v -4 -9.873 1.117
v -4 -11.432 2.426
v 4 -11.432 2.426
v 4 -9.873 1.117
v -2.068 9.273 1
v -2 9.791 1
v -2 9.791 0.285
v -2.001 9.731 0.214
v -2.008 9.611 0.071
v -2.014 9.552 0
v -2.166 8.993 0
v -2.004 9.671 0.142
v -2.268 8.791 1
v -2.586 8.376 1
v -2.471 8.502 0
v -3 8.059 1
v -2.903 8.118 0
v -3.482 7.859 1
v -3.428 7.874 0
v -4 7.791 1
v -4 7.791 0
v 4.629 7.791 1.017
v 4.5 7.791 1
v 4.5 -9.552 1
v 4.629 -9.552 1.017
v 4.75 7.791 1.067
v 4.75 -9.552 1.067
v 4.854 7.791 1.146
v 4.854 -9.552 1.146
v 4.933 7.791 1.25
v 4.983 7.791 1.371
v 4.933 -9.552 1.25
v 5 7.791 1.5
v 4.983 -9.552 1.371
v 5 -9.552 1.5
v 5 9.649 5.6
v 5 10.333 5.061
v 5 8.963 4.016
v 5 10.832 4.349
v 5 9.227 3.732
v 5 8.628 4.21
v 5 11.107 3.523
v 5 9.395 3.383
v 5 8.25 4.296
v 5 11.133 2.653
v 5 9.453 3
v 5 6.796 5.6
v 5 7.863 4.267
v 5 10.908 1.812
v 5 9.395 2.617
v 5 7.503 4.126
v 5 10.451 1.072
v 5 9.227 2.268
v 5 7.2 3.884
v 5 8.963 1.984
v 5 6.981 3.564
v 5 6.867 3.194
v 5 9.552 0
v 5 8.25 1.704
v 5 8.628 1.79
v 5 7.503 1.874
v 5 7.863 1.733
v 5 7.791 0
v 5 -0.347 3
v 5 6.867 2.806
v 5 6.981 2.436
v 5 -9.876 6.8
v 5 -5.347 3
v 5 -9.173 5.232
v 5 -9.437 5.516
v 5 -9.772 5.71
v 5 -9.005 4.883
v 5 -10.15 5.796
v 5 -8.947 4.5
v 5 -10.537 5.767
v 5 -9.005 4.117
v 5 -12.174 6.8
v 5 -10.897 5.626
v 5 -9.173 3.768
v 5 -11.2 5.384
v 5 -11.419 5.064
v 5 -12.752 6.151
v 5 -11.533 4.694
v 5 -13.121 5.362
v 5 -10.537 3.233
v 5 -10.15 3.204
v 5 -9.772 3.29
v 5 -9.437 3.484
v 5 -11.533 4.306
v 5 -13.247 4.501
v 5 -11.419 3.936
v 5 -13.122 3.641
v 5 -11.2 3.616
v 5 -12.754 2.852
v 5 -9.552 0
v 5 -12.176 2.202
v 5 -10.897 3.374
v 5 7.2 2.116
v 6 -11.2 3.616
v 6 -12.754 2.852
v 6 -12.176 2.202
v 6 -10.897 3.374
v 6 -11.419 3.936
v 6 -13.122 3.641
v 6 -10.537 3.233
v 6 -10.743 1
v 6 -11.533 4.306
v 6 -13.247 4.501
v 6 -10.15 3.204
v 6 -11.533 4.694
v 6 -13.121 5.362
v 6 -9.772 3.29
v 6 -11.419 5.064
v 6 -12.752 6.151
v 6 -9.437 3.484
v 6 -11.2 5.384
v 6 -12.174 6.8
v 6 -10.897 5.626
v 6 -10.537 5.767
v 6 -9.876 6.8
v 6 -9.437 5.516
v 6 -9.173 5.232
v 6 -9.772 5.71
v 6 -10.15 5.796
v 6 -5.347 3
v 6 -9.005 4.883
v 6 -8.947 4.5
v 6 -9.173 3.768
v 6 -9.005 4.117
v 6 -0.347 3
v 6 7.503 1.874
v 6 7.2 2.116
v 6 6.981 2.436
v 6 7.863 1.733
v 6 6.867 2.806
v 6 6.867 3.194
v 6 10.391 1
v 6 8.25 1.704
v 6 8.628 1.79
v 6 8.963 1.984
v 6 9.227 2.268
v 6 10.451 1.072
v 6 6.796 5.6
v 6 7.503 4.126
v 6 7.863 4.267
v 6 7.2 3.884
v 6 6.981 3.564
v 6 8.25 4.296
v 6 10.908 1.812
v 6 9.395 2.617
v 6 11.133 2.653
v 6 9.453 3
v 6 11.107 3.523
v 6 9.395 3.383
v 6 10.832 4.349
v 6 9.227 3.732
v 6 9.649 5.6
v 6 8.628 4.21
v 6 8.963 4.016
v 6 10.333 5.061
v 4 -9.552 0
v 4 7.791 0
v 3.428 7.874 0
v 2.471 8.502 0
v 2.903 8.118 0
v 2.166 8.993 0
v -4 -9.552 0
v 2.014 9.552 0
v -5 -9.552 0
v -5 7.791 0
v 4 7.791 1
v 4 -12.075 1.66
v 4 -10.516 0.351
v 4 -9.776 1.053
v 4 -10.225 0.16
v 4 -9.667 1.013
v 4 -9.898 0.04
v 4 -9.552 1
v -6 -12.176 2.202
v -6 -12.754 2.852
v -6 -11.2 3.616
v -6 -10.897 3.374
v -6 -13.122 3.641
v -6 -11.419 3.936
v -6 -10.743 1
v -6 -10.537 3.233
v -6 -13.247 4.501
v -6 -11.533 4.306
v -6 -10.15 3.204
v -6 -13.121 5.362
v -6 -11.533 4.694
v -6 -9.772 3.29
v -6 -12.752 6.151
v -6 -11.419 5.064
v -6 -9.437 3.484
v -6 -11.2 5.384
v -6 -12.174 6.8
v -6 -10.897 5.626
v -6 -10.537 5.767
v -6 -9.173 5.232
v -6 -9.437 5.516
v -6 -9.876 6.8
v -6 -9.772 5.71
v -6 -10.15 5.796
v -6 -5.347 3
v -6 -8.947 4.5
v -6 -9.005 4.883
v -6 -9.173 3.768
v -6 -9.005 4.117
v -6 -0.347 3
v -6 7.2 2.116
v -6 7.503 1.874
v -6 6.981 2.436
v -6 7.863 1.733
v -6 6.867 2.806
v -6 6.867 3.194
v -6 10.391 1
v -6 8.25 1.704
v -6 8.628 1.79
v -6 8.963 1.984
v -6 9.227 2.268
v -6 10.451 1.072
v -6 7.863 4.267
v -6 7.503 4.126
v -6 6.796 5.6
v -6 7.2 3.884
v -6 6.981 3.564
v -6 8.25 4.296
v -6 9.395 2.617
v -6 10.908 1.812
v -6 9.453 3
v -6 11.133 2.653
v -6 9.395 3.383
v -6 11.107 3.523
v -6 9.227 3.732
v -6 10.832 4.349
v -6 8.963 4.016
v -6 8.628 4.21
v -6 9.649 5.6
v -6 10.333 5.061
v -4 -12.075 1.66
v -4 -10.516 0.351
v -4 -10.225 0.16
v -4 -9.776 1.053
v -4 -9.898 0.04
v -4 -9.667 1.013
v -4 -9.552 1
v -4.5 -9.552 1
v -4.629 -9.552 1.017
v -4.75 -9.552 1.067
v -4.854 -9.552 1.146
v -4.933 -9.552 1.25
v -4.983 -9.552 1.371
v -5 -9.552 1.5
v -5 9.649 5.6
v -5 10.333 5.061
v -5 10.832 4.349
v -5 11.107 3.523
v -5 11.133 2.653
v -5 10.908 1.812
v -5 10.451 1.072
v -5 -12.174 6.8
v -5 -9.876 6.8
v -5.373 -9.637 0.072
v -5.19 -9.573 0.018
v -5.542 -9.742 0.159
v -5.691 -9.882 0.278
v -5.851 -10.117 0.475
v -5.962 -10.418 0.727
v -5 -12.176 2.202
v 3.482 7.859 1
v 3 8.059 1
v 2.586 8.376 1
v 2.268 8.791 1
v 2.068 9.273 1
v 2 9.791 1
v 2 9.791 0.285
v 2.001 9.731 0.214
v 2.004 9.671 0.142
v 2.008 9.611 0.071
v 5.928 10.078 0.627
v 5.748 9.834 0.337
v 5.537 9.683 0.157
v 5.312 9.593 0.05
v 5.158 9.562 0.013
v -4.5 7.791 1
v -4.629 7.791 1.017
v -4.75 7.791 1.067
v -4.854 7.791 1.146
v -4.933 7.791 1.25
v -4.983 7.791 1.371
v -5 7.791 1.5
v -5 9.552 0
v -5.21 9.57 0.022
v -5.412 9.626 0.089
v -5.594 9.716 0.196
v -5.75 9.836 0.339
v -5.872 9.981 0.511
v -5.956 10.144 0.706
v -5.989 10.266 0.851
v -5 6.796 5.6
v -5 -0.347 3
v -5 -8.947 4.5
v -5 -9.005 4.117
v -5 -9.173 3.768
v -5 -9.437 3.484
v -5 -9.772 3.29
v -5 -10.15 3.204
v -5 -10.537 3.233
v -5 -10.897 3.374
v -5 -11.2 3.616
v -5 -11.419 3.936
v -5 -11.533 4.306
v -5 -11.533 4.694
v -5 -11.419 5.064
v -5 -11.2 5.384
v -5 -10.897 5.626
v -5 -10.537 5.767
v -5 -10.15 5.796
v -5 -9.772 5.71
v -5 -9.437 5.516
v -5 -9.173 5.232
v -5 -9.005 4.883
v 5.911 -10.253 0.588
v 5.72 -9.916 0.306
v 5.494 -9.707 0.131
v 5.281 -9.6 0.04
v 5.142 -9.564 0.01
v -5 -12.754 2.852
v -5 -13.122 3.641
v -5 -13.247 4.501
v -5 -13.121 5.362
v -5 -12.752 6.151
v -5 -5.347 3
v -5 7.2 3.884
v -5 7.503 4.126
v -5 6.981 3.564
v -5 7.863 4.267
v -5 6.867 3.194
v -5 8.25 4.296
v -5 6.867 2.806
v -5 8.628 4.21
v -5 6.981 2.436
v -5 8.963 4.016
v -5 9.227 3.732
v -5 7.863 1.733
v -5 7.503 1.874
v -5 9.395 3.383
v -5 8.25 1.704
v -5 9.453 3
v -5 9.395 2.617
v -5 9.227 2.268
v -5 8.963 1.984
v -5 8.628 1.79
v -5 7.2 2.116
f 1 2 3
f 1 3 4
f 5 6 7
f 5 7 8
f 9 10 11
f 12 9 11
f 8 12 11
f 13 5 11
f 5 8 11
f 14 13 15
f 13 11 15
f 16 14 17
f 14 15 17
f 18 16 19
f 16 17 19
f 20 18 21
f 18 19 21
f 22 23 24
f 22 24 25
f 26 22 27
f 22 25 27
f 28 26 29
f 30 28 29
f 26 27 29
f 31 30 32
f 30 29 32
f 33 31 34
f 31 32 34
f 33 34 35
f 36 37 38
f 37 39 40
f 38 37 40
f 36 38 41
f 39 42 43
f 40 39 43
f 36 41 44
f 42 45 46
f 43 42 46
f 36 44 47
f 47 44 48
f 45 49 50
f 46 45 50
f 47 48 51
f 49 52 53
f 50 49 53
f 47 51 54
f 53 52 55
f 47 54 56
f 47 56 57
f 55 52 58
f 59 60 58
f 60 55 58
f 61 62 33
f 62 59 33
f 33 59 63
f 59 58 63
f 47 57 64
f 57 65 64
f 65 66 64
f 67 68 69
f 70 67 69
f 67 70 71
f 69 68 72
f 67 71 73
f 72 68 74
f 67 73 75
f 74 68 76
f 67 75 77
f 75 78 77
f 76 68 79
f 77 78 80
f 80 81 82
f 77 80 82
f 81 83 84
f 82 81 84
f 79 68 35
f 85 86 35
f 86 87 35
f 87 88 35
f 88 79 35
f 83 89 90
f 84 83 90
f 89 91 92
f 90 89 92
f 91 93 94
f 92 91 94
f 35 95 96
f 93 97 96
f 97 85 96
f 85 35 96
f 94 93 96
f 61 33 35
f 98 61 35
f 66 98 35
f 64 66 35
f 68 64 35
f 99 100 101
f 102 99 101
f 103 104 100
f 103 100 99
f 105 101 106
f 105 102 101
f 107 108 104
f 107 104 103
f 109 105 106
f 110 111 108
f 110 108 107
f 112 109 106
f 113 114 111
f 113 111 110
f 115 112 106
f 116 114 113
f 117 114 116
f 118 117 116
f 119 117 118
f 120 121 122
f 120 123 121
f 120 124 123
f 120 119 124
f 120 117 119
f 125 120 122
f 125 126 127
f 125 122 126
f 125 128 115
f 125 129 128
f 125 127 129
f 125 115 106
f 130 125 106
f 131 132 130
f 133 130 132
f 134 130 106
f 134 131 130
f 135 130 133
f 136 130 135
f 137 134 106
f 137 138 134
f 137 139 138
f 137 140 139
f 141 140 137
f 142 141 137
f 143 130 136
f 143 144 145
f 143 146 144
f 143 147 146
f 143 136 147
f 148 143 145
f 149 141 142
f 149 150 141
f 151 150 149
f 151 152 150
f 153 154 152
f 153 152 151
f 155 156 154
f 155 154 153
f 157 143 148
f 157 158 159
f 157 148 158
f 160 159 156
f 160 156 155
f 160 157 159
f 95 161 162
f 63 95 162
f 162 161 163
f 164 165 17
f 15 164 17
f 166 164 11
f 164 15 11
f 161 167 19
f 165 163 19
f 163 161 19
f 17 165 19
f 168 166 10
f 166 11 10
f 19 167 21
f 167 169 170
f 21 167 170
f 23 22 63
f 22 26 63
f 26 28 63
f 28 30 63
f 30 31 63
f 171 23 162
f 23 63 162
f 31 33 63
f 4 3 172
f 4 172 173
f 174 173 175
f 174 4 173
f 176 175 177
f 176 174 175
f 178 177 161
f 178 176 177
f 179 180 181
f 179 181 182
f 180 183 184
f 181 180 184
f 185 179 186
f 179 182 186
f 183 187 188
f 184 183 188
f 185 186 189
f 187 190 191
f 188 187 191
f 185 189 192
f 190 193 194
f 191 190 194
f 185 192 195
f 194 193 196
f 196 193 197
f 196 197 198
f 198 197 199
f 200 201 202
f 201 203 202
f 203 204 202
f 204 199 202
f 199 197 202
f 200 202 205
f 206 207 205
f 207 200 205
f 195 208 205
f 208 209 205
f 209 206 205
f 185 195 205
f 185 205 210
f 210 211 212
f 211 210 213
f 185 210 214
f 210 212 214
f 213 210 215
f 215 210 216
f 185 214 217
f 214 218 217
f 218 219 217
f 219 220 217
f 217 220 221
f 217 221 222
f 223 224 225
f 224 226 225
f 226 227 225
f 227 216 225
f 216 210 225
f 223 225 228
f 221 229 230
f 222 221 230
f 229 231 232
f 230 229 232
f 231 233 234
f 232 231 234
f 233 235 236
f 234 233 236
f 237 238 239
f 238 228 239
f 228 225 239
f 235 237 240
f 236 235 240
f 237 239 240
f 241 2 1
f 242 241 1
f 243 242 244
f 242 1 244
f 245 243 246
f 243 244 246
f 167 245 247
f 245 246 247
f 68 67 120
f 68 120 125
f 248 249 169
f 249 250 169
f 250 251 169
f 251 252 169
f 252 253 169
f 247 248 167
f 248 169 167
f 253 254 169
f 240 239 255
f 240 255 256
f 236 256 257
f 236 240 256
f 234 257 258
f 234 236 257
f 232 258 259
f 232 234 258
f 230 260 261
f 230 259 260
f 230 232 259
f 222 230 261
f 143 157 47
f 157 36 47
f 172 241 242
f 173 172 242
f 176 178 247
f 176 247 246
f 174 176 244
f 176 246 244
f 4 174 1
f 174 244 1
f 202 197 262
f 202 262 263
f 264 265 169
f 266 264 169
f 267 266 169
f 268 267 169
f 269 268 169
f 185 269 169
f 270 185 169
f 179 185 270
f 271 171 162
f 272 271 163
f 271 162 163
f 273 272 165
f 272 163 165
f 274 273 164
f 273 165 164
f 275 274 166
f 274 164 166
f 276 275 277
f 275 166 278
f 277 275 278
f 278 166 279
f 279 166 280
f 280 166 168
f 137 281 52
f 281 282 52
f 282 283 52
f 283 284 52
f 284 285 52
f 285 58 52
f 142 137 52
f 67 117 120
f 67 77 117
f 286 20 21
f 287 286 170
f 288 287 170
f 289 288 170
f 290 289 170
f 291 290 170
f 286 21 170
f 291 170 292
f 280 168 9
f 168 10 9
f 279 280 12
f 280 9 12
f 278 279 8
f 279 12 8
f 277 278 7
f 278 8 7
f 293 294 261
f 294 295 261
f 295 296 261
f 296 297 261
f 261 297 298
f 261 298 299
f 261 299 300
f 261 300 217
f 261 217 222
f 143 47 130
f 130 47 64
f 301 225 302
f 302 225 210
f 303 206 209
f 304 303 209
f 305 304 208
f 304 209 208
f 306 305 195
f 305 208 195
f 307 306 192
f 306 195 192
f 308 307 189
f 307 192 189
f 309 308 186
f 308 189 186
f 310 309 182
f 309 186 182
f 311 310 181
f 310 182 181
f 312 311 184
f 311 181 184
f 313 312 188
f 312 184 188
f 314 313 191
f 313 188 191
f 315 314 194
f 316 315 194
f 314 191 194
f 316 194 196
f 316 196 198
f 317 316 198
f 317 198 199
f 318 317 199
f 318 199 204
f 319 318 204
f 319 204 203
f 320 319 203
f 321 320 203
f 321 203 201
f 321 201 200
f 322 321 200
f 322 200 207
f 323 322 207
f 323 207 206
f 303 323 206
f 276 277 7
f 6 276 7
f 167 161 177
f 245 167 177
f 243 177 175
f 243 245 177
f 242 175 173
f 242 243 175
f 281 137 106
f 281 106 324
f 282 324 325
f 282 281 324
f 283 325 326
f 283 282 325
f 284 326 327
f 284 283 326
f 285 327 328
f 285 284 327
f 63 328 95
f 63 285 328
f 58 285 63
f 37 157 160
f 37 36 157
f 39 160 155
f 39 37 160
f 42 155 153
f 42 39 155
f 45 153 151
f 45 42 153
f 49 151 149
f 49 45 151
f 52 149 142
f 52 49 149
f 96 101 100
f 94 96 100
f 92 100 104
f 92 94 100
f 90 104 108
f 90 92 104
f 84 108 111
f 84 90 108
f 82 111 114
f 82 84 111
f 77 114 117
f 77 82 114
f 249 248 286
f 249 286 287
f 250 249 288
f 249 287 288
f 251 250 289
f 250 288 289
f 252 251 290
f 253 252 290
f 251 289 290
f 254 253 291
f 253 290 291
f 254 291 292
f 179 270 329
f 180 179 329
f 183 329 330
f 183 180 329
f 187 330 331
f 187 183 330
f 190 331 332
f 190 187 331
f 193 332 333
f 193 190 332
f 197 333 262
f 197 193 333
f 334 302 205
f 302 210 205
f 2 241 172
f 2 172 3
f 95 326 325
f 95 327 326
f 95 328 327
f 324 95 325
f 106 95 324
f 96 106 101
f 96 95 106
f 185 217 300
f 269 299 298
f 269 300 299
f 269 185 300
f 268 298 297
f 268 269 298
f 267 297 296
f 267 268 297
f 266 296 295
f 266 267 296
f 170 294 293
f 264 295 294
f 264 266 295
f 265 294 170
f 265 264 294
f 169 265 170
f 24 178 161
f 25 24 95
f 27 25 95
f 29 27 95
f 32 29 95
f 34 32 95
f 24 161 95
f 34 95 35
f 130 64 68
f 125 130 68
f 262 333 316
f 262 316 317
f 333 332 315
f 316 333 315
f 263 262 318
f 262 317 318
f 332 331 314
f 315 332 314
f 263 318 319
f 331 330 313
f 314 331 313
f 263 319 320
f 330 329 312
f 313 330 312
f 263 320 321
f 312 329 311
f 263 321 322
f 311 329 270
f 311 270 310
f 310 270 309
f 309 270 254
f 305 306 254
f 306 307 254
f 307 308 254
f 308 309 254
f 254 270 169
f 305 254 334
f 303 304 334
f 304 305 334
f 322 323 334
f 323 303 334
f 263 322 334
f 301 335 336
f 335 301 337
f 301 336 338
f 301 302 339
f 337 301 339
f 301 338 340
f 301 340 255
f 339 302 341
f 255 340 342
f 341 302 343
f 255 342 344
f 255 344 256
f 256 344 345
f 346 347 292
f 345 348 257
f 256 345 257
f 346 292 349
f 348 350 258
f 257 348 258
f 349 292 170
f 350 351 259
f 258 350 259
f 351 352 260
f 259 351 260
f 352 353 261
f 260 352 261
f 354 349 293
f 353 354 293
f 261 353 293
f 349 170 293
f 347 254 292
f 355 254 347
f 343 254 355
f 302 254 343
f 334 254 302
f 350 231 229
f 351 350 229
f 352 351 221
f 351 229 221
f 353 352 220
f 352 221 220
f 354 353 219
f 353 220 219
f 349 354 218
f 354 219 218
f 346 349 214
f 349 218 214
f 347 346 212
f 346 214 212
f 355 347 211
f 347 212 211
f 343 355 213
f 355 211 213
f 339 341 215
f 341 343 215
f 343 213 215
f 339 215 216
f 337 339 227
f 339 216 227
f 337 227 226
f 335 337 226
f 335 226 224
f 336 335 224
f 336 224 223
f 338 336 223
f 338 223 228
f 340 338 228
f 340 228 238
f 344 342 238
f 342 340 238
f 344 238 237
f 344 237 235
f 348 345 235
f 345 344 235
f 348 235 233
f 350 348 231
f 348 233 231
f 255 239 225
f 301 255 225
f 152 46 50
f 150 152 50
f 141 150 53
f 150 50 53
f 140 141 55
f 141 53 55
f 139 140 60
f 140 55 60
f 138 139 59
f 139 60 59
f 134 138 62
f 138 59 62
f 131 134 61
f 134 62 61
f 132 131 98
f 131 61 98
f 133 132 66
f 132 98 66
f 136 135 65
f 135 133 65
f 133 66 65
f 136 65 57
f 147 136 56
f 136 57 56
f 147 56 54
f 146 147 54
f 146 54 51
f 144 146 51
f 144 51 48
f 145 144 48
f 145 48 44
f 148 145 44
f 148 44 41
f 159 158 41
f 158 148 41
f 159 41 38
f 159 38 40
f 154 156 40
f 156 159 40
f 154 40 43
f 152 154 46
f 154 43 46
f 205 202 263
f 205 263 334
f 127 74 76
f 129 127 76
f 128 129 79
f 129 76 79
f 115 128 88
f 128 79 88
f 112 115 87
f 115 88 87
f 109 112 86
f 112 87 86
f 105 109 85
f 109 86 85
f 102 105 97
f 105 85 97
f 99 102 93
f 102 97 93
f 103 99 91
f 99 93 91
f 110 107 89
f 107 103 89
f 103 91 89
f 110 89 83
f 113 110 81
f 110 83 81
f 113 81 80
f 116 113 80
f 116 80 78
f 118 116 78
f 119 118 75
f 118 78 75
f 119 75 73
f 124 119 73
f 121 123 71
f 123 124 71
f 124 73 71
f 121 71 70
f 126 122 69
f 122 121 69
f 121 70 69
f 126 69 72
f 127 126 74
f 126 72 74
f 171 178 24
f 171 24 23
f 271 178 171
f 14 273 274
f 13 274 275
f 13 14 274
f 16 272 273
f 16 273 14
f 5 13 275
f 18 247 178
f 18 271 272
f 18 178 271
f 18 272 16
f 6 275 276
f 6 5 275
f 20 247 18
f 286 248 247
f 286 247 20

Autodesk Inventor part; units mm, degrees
ref_plane "YZ Plane" through (0, 0, 0) normal (1, 0, 0) x (0, 1, 0)
ref_plane "XZ Plane" through (0, 0, 0) normal (0, 1, 0) x (-1, 0, 0)
ref_plane "XY Plane" through (0, 0, 0) normal (0, 0, 1) x (1, 0, 0)
sketch "Sketch2" plane through (0, 0, 0) normal (1, 0, 0) x (0, 1, 0)
  line L0 (0, 8.1606) -> (0, -1.3601) projected
  line L1 (-18.1996, 0) -> (16.4587, 0) construction
  arc A0 (-12.1735, 6.8) -> (-12.1757, 2.2019) centre (-10.2473, 4.5) ccw
  arc A1 (10.4508, 1.0716) -> (9.6493, 5.6) centre (8.1527, 3) ccw
  circle A2 centre (8.1527, 3) radius 1.3
  circle A3 centre (-10.2473, 4.5) radius 1.3
  line L2 (-0.3473, 3) -> (-5.3473, 3)
  line L3 (-9.5516, 0) -> (-12.1757, 2.2019)
  line L4 (9.5516, 0) -> (10.4508, 1.0716)
  line L5 (-9.5516, 0) -> (9.5516, 0)
  line L6 (-9.876, 6.8) -> (-5.3473, 3)
  line L7 (9.6493, 5.6) -> (6.7961, 5.6)
  line L8 (6.7961, 5.6) -> (-0.3473, 3)
  line L9 (-12.1735, 6.8) -> (-9.876, 6.8)
  point P0 (0, 0)
  dimension "d6" = 3
  dimension "d7" = 3
  dimension "d9" = 4.5
  dimension "d10" = 18.4
  dimension "d16" = 3
  dimension "d17" = 2.6
  dimension "d36" = 40
  dimension "d37" = 6.8
  dimension "d38" = 5.6
  dimension "d39" = 8.5
  dimension "d40" = 5
  dimension "d41" = 3
  dimension "d42" = 160
  dimension "d43" = 40
extrude "Extrusion1" add sketch "Sketch2" along normal mid plane 12
shell "Shell1" thickness 1 removed faces 11 at (2, -12.3599, 2.37) at (2, 9.8602, 5.4667) at (2, 9.4358, 2.7915) at (2, -8.9642, 4.2915) at (2, -3.6807, 3) at (-2, -11.301, 1.4679) at (2, 10.1511, 0.7144) at (2, 2.0338, 3.8667) at (2, 7.7472, 5.6) at (-2, -6.8569, 4.2667) at (-2, -10.6418, 6.8)
fillet "Fillet2" radius 0.5 2 edges at (-5, -0.1763, 1) (5, -0.1763, 1)
fillet "Fillet3" radius 1 2 edges at (6, 0, 0) (-6, 0, 0)
sketch "Sketch5" plane through (6, -9.5516, 0) normal (0, 0, -1) x (-1, 0, 0)
  line L0 (1, 17.3423) -> (2, 17.3423)
  line L1 (10, 17.3423) -> (11, 17.3423)
  arc A0 (2, 17.3423) -> (4, 19.3423) centre (2, 19.3423) ccw
  arc A1 (8, 19.3423) -> (10, 17.3423) centre (10, 19.3423) ccw
  line L2 (4, 19.3423) -> (4, 20.5415)
  line L3 (4, 20.5415) -> (1, 20.5415)
  line L4 (8, 19.3423) -> (8, 20.5415)
  line L5 (8, 20.5415) -> (11, 20.5415)
  line L6 (1, 20.5415) -> (1, 17.3423)
  line L7 (11, 20.5415) -> (11, 17.3423)
  line L8 (1, -1.7876) -> (1, 20.3024) projected
  line L9 (11, 20.3024) -> (11, -1.7876) projected
  line L10 (10.5, 19.9423) -> (1.5, 19.9423) projected
  point P0 (6, -9.8516)
  dimension "d47" = 2
  dimension "d53" = 3.1991
  dimension "d54" = 3
  dimension "d55" = 3.1991
  dimension "d56" = 3
  dimension "d57" = 2
  dimension "d58" = 2.6
extrude "Extrusion4" cut sketch "Sketch5" against normal up to next
sketch "Sketch7" plane through (-4.5, -10.7434, 1) normal (0, 0, 1) x (1, 0, 0)
  line L0 (6.5, 20.5341) -> (6.5, 21.1341) projected
  line L1 (2.5, 21.1341) -> (6.5, 21.1341) projected
  line L2 (-0.5, 1.1918) -> (11.5, 1.1918) projected
  line L3 (6.5, 20.295) -> (2.5, 20.295) projected
  line L4 (-0.5, 1.1918) -> (9.5, 1.1918)
  line L5 (9.5, 1.1918) -> (9.5, -0.8082)
  line L6 (9.5, -0.8082) -> (-0.5, -0.8082)
  line L7 (-0.5, -0.8082) -> (-0.5, 1.1918)
  line L8 (-0.5, -1.4301) -> (-0.5, 0.8674) projected
  line L9 (2.5, 21.1341) -> (6.5, 21.1341)
  line L10 (6.5, 21.1341) -> (6.5, 20.5341)
  line L11 (6.5, 20.5341) -> (2.5, 20.5341)
  line L12 (2.5, 20.5341) -> (2.5, 21.1341)
  point P0 (2.5, 20.5341)
  point P1 (4.5, 10.7434)
  point P2 (9.5, -0.5959)
  dimension "d52" = 2
extrude "Extrusion5" cut sketch "Sketch7" along normal through all both and the other way through all
sketch "Sketch8" plane through (0, 0, 0) normal (1, 0, 0) x (0, 1, 0)
  line L0 (-9.5516, 1) -> (7.7907, 1) projected
  line L1 (-9.5516, 0) -> (9.5516, 0) projected
  line L2 (-12.0753, 1.6595) -> (-11.4325, 2.4256)
  line L3 (-9.5516, 1) -> (-9.5516, 0)
  line L4 (-11.4325, 2.4256) -> (-9.873, 1.117)
  arc A0 (-9.873, 1.117) -> (-9.5516, 1) centre (-9.5516, 1.5) ccw
  line L5 (-12.0753, 1.6595) -> (-10.5158, 0.3509)
  arc A1 (-10.5158, 0.3509) -> (-9.5516, 0) centre (-9.5516, 1.5) ccw
  point P0 (0, 0)
  dimension "d61" = 50
  dimension "d62" = 1
  dimension "d63" = 1.5
  dimension "d64" = 3
extrude "Extrusion6" add sketch "Sketch8" along normal mid plane 8
properties material "Steel"
